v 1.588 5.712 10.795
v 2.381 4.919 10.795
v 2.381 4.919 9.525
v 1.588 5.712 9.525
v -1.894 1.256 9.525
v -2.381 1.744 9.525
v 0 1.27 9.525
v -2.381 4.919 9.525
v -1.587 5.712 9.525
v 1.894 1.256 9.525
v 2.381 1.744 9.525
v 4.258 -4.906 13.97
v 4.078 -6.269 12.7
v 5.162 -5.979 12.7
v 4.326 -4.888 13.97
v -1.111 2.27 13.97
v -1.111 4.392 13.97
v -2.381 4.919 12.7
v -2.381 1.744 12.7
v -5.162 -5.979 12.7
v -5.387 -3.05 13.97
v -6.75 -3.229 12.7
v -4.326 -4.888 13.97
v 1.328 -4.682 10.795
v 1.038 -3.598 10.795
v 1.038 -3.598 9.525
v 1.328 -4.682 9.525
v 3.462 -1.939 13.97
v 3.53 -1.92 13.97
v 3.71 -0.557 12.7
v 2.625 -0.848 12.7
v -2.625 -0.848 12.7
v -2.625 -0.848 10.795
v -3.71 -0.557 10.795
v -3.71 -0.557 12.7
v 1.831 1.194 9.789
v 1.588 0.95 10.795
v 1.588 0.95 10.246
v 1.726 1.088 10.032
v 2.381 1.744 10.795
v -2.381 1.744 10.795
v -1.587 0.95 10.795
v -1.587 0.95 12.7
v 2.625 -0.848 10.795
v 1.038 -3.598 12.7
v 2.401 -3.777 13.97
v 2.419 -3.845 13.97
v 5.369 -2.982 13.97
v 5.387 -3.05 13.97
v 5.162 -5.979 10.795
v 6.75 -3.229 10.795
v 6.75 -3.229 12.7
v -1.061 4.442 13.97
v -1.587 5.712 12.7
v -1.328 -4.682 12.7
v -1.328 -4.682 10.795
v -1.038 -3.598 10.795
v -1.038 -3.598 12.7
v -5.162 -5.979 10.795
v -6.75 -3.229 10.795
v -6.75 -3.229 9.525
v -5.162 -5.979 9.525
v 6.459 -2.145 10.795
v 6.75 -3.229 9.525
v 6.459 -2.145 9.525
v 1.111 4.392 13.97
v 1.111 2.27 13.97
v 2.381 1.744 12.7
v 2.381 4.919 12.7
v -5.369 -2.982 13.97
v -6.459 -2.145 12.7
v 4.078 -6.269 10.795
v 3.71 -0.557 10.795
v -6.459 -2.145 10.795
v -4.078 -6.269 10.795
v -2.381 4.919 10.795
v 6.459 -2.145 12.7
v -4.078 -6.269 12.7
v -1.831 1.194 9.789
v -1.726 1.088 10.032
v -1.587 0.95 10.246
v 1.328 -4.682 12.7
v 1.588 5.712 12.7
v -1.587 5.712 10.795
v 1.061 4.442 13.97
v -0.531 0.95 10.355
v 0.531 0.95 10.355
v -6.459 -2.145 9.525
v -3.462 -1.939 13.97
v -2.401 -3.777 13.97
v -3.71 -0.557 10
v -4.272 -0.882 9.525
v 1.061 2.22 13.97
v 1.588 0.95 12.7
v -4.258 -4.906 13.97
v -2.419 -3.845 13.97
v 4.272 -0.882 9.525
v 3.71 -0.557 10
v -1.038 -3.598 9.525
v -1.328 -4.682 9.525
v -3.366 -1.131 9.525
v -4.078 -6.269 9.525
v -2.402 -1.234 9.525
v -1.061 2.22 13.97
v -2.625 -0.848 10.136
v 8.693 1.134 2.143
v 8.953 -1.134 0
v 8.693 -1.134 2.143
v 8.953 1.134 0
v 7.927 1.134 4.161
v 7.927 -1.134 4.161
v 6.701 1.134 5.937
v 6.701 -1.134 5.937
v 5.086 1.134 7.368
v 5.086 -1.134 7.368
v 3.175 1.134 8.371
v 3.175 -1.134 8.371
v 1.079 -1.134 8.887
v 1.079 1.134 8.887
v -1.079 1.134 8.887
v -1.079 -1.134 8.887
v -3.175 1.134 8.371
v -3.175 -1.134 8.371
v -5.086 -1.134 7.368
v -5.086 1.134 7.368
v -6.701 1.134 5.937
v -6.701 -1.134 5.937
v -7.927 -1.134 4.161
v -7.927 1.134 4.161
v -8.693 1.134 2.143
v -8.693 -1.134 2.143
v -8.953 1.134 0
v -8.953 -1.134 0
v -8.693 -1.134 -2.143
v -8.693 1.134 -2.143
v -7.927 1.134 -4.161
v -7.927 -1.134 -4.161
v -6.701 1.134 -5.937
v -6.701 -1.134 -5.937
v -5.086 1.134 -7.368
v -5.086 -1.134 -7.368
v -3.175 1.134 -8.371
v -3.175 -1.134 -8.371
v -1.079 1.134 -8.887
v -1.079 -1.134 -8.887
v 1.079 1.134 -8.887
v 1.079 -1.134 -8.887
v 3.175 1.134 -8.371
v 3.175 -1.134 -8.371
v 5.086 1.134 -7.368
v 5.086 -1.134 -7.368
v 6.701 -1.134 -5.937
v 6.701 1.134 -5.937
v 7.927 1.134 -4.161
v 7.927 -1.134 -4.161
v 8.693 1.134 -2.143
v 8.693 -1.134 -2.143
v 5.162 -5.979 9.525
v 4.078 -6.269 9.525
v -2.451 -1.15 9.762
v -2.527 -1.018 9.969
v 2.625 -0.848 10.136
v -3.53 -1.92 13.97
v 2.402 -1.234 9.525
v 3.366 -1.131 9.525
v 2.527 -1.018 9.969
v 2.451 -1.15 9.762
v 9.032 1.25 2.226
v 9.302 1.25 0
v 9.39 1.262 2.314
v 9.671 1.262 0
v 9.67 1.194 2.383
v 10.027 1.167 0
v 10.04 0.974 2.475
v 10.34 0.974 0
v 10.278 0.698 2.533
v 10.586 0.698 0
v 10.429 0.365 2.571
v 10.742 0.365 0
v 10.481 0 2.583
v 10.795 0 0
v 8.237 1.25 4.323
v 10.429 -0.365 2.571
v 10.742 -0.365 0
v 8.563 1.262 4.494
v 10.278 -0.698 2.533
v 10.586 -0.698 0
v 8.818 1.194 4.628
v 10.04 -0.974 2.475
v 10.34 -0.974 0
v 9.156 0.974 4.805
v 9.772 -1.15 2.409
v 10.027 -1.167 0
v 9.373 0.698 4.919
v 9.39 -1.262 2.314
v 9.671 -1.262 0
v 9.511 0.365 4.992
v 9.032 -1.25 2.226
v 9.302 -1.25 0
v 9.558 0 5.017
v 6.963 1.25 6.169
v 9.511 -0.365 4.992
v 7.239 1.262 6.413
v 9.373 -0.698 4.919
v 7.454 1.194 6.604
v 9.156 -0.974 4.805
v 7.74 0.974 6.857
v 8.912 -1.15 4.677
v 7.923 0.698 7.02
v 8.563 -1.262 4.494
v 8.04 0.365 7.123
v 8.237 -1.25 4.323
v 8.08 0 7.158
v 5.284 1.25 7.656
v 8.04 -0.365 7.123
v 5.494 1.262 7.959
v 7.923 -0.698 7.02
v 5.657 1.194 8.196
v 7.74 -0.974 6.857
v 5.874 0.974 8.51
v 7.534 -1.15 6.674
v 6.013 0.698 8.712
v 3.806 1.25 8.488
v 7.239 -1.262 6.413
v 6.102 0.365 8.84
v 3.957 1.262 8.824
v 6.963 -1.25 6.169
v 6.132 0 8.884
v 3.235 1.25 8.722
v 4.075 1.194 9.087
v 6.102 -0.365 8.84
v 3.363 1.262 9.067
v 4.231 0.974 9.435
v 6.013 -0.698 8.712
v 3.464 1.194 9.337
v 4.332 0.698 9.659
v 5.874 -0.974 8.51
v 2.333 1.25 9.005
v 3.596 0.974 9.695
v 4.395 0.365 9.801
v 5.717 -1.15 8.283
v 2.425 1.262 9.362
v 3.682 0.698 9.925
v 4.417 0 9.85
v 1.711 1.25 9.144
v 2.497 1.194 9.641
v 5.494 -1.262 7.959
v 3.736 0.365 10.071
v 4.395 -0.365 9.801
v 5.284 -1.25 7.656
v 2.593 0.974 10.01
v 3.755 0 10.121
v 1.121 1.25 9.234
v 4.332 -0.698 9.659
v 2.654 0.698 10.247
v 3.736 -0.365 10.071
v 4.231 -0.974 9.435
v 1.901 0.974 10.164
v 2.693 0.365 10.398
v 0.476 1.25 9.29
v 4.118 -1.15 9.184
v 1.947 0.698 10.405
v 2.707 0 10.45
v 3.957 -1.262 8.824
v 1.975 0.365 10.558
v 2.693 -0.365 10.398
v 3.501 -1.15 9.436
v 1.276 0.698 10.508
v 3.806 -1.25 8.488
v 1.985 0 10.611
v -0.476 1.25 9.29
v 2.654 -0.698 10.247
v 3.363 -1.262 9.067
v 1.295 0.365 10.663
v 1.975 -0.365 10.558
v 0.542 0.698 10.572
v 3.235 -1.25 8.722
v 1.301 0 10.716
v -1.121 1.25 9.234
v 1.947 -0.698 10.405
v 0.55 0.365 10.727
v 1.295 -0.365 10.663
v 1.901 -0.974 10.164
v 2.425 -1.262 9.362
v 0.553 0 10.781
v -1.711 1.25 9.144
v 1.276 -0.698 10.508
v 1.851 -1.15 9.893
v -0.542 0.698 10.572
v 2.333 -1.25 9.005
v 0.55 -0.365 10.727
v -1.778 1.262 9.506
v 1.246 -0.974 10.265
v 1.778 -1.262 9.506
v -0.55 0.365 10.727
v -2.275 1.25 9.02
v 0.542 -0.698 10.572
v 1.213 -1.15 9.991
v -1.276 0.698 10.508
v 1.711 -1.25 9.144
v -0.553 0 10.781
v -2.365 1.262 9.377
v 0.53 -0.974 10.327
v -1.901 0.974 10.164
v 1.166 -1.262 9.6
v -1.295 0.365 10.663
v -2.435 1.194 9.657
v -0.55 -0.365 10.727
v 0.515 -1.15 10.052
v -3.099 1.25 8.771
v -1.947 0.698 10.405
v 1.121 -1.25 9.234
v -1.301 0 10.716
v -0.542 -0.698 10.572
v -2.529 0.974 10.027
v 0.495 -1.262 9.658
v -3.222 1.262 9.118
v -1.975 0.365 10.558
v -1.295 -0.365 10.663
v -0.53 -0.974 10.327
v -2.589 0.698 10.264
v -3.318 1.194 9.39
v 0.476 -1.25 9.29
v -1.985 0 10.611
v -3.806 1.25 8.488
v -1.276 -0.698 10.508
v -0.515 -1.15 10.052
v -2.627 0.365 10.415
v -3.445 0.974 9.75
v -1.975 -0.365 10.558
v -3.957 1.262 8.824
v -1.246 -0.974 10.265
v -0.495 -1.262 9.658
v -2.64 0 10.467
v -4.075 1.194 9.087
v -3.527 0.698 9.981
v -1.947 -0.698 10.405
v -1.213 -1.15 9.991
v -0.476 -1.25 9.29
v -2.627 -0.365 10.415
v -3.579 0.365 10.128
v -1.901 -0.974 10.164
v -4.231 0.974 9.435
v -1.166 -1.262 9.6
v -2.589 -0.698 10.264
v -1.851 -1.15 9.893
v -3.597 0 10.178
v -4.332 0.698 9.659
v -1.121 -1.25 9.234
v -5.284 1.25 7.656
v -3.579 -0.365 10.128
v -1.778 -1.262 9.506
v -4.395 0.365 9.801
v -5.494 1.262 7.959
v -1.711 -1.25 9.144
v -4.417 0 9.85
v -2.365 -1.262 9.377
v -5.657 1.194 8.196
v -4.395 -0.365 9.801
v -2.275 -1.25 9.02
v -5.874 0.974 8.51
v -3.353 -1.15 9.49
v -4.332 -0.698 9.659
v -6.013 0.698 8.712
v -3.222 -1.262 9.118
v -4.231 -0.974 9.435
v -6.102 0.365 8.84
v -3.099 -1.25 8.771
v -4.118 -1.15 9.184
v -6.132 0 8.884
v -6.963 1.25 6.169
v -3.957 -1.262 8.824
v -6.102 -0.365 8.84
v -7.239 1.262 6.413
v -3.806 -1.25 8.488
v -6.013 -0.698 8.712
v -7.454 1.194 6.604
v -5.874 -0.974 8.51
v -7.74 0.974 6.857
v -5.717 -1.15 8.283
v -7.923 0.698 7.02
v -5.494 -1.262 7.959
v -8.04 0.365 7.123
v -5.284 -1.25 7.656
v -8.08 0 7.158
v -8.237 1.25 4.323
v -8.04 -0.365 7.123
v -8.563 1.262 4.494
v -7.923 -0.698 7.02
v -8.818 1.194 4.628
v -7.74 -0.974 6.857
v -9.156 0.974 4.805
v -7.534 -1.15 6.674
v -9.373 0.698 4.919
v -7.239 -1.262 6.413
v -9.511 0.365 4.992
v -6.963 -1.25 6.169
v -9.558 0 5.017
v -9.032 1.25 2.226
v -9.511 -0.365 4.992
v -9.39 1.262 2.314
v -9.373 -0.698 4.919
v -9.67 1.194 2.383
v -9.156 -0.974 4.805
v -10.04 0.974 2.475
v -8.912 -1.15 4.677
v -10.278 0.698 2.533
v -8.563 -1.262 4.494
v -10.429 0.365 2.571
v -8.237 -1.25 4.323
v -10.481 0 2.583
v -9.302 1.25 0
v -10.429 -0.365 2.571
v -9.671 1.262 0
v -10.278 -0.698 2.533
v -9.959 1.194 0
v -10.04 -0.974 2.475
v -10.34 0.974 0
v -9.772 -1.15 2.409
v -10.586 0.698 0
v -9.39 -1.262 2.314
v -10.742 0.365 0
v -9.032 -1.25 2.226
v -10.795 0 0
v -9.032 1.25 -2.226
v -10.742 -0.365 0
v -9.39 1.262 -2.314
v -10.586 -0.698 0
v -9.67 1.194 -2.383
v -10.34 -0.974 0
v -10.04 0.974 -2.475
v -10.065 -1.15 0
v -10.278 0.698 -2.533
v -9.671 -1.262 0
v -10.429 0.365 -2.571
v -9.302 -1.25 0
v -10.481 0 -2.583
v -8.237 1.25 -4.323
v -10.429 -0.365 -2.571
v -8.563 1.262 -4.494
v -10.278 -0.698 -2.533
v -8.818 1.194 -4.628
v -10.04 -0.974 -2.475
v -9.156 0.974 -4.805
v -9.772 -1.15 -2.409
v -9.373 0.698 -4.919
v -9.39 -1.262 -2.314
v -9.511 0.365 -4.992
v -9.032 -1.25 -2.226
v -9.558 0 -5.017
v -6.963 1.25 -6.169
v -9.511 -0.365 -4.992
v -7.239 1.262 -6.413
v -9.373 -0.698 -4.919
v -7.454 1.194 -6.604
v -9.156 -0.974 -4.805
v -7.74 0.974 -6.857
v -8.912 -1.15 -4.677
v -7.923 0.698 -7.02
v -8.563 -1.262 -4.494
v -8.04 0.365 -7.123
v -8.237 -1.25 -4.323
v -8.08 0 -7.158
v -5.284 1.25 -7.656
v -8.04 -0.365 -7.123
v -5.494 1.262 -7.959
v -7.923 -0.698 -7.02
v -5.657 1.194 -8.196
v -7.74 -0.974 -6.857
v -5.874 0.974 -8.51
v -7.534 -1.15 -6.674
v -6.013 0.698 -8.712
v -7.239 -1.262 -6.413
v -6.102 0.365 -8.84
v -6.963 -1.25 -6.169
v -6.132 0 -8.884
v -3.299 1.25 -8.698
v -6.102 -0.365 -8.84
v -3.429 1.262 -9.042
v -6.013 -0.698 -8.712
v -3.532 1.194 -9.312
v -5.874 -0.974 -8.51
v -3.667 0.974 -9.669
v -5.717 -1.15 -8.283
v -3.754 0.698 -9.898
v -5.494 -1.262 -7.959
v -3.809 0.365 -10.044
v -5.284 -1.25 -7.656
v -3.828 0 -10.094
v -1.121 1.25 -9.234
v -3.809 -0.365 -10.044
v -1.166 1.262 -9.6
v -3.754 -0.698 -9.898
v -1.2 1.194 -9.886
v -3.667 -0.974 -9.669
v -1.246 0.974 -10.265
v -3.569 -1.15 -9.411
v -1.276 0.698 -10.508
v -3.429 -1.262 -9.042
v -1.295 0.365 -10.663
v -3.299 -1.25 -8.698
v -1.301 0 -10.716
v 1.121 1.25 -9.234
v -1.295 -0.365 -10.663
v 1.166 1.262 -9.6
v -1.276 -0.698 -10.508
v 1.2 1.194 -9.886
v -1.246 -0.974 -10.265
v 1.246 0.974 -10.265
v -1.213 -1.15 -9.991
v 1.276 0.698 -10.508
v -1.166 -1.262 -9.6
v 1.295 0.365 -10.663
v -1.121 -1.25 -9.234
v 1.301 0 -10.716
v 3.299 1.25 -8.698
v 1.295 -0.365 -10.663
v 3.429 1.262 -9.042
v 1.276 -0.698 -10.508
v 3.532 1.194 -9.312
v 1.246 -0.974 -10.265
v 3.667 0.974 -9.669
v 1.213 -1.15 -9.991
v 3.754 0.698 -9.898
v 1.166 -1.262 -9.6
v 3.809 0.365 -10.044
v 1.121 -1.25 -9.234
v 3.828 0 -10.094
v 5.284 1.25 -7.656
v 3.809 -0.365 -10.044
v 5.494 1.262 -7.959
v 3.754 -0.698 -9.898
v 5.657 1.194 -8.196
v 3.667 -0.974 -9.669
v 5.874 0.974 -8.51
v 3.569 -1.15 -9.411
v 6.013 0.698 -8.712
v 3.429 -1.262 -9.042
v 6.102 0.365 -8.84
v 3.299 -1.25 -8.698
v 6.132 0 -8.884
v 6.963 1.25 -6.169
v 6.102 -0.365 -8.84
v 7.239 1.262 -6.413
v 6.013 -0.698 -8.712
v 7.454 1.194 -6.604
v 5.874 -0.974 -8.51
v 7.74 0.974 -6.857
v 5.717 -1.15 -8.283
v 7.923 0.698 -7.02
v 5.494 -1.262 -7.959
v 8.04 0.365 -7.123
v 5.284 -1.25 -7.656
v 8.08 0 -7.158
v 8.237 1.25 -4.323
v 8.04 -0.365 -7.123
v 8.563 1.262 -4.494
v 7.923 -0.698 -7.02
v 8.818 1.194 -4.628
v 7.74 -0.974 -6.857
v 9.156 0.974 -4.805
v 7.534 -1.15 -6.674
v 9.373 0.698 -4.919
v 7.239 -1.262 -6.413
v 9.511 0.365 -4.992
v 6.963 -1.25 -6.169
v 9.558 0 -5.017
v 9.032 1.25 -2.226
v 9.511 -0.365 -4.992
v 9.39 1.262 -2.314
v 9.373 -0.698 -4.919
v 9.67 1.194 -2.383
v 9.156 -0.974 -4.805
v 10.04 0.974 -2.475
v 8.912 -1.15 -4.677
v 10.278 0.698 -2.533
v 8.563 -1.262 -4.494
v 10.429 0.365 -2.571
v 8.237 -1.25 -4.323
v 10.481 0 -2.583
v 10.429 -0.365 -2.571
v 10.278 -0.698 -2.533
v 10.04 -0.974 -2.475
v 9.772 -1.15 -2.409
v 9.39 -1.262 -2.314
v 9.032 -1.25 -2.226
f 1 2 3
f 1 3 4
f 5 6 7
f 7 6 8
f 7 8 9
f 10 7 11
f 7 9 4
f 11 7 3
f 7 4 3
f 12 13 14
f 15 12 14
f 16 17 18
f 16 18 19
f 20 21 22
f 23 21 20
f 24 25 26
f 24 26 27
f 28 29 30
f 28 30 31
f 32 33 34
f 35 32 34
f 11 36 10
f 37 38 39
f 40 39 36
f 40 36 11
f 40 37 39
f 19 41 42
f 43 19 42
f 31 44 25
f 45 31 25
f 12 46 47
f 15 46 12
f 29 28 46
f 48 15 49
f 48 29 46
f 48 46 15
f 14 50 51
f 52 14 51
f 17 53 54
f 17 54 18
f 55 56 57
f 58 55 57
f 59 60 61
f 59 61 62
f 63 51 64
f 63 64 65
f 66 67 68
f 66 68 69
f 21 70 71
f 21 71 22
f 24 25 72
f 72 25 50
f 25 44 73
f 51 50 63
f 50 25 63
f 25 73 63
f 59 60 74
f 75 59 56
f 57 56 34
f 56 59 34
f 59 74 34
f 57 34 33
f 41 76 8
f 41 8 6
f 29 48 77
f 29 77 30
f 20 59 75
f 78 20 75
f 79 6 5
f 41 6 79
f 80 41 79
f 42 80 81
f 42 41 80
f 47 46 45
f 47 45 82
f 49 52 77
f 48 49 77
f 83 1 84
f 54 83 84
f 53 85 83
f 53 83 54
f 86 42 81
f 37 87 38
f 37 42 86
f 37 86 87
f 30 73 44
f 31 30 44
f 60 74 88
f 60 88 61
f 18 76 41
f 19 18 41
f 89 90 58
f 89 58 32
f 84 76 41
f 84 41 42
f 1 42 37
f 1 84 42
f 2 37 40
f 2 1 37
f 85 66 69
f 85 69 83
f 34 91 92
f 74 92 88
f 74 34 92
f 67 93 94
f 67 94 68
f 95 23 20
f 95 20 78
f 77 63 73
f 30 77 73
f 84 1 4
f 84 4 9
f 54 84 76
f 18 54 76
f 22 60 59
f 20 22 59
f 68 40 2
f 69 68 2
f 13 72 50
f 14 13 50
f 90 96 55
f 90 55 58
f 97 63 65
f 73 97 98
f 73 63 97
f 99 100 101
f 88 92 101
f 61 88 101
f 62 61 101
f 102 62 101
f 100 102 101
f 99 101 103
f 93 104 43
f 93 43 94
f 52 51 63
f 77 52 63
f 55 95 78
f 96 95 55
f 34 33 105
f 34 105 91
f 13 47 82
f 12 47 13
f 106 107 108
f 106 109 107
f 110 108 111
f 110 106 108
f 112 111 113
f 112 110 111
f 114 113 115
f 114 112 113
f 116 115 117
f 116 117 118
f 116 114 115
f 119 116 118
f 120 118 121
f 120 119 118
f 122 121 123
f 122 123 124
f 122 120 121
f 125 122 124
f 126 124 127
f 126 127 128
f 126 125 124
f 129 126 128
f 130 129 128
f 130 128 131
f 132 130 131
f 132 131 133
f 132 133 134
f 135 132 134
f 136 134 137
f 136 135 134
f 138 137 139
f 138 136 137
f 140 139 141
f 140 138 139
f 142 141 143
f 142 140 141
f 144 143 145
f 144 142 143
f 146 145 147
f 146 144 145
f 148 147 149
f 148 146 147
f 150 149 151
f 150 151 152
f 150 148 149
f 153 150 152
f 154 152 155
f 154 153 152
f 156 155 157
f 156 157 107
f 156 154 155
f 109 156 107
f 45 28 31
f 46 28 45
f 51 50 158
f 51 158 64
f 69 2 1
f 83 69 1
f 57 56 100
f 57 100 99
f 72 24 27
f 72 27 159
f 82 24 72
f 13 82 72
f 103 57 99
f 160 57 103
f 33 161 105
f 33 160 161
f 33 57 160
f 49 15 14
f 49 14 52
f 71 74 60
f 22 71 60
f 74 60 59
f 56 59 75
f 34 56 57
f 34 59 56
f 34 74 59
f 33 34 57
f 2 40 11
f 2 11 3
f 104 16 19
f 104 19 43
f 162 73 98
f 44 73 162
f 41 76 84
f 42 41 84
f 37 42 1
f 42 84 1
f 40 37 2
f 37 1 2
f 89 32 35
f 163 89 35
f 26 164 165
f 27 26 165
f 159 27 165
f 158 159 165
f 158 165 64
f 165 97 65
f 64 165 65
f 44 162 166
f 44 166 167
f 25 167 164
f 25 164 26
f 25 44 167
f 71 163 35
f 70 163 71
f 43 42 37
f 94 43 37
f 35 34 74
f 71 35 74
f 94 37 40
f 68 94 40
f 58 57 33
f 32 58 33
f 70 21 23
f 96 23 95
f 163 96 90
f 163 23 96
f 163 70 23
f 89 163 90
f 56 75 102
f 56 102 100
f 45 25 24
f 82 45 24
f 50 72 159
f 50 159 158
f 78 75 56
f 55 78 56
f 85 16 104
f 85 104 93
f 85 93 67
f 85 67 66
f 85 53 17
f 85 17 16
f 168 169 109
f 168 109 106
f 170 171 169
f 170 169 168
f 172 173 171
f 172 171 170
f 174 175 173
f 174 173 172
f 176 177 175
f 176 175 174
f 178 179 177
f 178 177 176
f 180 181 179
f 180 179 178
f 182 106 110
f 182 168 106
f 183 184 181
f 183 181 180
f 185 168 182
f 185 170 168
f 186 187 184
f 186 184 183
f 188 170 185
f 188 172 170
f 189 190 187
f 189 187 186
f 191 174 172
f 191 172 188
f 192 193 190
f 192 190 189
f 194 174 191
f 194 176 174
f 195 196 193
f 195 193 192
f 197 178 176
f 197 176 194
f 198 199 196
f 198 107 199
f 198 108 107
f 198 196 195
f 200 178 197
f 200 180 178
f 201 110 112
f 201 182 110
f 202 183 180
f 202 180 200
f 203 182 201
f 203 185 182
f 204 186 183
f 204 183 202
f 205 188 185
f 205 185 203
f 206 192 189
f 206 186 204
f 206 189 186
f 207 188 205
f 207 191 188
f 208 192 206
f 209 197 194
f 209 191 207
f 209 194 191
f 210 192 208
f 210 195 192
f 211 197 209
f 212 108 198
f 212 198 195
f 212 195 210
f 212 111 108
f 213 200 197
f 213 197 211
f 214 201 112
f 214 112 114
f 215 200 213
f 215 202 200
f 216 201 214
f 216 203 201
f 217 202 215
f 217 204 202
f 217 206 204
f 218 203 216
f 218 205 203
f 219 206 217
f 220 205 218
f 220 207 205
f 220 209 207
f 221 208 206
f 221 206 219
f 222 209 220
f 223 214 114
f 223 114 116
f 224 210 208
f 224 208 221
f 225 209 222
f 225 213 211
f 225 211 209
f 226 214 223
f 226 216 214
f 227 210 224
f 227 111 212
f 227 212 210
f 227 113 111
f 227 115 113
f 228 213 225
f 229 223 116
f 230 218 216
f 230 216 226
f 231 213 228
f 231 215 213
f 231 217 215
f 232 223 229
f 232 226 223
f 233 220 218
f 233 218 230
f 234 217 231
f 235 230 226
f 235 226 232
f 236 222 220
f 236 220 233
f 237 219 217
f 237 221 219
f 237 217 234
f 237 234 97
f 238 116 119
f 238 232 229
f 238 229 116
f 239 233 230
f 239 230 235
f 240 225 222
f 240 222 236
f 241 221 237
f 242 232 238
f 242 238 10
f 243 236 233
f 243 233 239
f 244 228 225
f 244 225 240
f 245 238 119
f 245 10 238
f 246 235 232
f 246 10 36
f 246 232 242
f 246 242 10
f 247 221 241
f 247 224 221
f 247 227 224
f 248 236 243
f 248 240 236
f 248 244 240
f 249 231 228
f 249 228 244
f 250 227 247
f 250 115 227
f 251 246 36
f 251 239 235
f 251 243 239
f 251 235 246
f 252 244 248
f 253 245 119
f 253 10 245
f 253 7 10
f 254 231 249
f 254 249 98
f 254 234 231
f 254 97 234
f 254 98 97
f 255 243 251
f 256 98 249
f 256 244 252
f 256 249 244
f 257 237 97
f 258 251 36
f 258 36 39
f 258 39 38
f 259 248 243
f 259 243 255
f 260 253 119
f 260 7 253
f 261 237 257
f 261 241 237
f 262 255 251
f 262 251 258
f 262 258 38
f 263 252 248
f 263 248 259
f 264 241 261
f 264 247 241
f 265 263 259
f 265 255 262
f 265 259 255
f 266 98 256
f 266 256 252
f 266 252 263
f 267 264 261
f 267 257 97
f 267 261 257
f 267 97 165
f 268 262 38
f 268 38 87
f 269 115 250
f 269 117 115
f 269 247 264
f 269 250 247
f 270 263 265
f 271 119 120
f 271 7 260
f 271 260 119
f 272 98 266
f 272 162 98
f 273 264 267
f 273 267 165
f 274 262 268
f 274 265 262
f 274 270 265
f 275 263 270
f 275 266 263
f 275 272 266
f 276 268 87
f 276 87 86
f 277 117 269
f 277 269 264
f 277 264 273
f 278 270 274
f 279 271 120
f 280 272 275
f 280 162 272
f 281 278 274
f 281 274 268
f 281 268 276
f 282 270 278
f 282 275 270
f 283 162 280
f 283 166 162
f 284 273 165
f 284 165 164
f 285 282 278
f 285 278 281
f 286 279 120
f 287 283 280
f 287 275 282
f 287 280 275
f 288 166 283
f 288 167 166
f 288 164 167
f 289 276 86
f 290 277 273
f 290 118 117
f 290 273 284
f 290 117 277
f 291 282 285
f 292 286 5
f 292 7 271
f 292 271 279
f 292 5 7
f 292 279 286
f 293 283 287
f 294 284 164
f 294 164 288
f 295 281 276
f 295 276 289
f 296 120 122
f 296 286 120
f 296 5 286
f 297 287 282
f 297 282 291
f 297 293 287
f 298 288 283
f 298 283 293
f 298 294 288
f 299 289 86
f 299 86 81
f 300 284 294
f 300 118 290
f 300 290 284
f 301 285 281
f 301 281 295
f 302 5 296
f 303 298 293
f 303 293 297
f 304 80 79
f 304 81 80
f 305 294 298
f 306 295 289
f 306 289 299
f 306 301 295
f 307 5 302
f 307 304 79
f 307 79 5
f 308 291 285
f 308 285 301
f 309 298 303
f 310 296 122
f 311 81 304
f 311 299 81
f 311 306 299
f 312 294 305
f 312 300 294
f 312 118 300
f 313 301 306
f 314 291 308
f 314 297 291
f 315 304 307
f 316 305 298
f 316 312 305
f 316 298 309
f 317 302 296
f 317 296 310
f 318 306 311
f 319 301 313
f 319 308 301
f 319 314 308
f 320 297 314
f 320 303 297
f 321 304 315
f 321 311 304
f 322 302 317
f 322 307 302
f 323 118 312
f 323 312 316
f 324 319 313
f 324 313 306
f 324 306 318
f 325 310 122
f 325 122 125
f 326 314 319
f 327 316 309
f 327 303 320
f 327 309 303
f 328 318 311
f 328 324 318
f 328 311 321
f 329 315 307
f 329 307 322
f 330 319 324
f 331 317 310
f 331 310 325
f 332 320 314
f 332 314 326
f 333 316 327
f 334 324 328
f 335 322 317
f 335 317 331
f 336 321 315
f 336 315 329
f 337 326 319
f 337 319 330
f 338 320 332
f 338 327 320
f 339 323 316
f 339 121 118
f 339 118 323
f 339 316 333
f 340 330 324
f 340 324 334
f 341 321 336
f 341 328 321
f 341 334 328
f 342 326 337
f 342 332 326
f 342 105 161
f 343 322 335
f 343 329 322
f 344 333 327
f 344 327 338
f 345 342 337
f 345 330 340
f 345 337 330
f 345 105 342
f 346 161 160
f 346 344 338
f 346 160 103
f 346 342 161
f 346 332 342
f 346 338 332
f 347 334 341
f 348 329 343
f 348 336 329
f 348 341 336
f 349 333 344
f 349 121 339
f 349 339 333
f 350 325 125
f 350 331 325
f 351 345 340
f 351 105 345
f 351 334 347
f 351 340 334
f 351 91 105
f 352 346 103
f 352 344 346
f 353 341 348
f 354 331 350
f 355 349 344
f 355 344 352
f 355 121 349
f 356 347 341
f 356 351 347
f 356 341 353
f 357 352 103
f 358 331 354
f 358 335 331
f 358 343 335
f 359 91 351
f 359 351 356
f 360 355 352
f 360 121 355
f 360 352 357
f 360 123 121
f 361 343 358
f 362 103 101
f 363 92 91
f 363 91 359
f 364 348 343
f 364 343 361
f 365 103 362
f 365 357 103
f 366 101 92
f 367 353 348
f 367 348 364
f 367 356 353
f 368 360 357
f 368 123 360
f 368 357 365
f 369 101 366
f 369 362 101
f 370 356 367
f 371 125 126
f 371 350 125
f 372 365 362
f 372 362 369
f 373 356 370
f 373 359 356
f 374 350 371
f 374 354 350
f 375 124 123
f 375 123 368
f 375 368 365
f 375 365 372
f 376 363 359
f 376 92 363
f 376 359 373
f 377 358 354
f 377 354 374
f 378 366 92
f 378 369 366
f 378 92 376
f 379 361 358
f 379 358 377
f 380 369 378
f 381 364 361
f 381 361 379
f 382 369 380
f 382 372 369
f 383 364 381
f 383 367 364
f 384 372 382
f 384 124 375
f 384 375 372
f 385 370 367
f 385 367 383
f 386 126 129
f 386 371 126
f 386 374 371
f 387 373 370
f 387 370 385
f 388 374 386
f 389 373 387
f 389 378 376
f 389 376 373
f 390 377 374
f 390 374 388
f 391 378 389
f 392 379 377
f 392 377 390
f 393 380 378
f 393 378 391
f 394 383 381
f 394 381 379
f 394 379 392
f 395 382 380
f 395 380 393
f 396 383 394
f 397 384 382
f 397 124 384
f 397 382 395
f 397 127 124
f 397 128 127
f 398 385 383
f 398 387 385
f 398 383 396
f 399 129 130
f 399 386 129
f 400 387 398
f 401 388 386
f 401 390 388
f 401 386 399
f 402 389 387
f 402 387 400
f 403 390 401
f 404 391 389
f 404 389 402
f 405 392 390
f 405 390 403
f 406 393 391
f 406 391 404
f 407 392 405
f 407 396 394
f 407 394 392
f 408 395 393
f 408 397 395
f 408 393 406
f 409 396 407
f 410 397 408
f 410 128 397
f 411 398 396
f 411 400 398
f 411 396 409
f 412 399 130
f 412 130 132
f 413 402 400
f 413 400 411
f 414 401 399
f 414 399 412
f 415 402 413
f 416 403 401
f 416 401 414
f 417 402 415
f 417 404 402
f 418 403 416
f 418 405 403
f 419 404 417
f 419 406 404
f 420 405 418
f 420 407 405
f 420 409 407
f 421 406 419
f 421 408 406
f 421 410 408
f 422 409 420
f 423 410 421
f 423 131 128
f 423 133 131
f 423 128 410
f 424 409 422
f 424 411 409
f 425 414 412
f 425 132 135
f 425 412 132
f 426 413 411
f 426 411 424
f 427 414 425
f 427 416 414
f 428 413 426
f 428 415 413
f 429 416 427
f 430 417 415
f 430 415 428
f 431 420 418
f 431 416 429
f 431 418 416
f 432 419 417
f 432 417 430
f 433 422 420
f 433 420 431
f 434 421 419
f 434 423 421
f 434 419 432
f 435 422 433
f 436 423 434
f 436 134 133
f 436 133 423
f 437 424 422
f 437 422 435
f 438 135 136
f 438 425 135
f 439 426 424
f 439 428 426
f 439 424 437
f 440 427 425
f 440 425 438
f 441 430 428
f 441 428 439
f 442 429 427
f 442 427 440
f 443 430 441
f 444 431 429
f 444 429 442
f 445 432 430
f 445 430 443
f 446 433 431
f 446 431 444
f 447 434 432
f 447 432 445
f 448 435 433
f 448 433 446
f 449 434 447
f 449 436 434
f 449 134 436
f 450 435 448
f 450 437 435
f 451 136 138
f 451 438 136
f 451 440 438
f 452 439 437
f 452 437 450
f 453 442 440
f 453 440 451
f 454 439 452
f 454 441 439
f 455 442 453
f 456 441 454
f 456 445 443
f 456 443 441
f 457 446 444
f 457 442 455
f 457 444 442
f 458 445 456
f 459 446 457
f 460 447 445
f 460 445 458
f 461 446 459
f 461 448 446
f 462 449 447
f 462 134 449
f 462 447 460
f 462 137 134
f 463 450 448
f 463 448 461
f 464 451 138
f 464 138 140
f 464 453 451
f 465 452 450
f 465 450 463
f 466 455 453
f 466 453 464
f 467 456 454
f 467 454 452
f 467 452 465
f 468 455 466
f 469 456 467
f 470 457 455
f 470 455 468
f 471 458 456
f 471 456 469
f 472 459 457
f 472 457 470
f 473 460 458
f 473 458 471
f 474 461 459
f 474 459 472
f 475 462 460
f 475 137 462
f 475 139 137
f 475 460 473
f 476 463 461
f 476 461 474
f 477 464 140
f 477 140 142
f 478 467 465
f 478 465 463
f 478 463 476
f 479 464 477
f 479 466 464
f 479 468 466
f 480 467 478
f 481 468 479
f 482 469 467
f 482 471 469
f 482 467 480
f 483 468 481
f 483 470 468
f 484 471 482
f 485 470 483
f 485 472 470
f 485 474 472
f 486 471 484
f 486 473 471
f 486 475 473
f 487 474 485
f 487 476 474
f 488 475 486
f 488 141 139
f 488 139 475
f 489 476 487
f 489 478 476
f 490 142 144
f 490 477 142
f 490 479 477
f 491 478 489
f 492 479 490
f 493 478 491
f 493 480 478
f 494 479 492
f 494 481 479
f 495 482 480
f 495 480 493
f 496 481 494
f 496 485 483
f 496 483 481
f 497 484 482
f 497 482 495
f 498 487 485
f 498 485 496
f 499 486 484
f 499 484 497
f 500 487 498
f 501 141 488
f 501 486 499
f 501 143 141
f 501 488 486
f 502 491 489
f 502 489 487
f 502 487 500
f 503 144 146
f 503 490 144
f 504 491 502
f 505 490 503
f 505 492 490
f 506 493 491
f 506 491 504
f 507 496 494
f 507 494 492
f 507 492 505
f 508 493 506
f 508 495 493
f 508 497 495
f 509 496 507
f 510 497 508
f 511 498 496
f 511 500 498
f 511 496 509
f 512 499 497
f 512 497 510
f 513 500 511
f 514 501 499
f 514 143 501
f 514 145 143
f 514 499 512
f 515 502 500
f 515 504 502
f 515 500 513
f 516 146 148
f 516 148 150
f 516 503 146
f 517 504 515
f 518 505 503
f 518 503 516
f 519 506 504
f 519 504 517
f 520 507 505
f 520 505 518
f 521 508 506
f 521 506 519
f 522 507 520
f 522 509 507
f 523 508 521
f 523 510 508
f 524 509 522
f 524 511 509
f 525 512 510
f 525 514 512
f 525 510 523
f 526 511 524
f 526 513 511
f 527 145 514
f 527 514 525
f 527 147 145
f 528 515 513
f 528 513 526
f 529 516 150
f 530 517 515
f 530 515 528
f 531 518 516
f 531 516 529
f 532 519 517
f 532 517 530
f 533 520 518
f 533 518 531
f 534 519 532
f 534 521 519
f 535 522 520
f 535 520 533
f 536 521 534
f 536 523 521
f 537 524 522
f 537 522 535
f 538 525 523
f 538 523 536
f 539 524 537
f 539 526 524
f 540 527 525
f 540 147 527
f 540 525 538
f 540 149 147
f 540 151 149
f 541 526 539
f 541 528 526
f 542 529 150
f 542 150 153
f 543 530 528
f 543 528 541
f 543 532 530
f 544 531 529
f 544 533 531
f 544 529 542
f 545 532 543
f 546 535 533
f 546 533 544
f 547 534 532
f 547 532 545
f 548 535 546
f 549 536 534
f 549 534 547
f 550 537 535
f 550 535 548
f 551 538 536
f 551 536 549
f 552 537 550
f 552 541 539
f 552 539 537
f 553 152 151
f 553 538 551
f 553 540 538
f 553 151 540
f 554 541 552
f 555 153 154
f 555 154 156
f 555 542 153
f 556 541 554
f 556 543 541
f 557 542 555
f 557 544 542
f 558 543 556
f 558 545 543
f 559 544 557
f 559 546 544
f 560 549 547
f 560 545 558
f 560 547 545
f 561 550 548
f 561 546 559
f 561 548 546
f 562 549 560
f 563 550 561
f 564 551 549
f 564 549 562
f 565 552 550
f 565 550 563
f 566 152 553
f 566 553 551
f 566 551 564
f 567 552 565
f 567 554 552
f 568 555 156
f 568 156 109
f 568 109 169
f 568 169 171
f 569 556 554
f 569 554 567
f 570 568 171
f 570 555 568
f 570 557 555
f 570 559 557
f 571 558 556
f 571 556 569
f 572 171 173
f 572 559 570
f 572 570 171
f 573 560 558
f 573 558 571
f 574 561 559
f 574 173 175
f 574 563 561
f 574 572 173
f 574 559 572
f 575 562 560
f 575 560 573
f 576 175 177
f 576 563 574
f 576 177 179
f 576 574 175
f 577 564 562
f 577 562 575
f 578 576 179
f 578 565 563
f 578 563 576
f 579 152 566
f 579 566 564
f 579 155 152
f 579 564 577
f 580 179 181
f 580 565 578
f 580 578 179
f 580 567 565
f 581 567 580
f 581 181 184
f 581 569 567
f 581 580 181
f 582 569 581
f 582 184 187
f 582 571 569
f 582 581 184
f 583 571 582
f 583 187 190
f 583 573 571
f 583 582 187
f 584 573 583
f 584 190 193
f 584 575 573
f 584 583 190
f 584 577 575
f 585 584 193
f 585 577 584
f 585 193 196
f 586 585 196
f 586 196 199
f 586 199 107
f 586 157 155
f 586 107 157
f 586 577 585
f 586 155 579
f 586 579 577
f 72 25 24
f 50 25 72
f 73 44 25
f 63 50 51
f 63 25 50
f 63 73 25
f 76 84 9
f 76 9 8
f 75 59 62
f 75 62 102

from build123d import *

# Parameters (mm, degrees)
F5_DEPTH  = 3.175
F6_SIZE   = 1.27
F6_2_SIZE = 1.27
F6_3_SIZE = 1.27
F7_DEPTH  = 1.27


with BuildPart() as f2:
    # F2: sweep along a path in F0
    with BuildLine(Plane.XZ) as f2_path:
        CenterArc((0, 0), 9.525, 0, 360)
    # F1 (on Top) → F2 (sweep)
    with BuildSketch(Plane.XY):
        with BuildLine():
            Line((-8.9527293057, 0), (-8.9527293057, 1.133757581))
            ThreePointArc((-8.9527293057, 1.133757581), (-10.795, 0), (-8.9527293057, -1.133757581))
            Line((-8.9527293057, -1.133757581), (-8.9527293057, 0))
        make_face()
    sweep(path=f2_path.line)

    # F4 (on offset) → F7 (join)
    with BuildSketch(Plane.XY.offset(10.795)):
        Polygon((2.625412817, -0.8479611432), (1.831662817, -2.2227764717), (1.037912817, -3.5975918002), (1.3284454812, -4.6818744645), (2.7032608097, -5.4756244645), (4.0780761382, -6.2693744645), (5.1623588025, -5.9788418002), (5.9561088025, -4.6040264717), (6.7498588025, -3.2292111432), (6.4593261382, -2.144928479), (5.0845108097, -1.351178479), (3.7096954812, -0.557428479), align=None)
        Polygon((-1.0379127641, -3.5975918002), (-1.8316627641, -2.2227764717), (-2.6254127641, -0.8479611432), (-3.7096954284, -0.557428479), (-5.0845107569, -1.351178479), (-6.4593260854, -2.144928479), (-6.7498587497, -3.2292111432), (-5.9561087497, -4.6040264717), (-5.1623587497, -5.9788418002), (-4.0780760854, -6.2693744645), (-2.7032607569, -5.4756244645), (-1.3284454284, -4.6818744645), align=None)
        Polygon((-1.5874999736, 0.9497565438), (2.64e-08, 0.9497565438), (1.5875000264, 0.9497565438), (2.3812500264, 1.7435065438), (2.3812500264, 3.3310065438), (2.3812500264, 4.9185065438), (1.5875000264, 5.7122565438), (2.64e-08, 5.7122565438), (-1.5874999736, 5.7122565438), (-2.3812499736, 4.9185065438), (-2.3812499736, 3.3310065438), (-2.3812499736, 1.7435065438), align=None)
    extrude(amount=-F7_DEPTH)


with BuildPart() as f5:
    # F4 (on offset) → F5 (new body)
    with BuildSketch(Plane.XY.offset(10.795)):
        Polygon((-1.5874999736, 0.9497565438), (2.64e-08, 0.9497565438), (1.5875000264, 0.9497565438), (2.3812500264, 1.7435065438), (2.3812500264, 3.3310065438), (2.3812500264, 4.9185065438), (1.5875000264, 5.7122565438), (2.64e-08, 5.7122565438), (-1.5874999736, 5.7122565438), (-2.3812499736, 4.9185065438), (-2.3812499736, 3.3310065438), (-2.3812499736, 1.7435065438), align=None)
    extrude(amount=F5_DEPTH)

    # F6
    f6_edges = [f5.edges().sort_by_distance(p)[0] for p in [
        (-1.984375, 1.346632, 13.97),
        (0, 0.949757, 13.97),
        (1.984375, 1.346632, 13.97),
        (2.38125, 3.331007, 13.97),
        (1.984375, 5.315382, 13.97),
        (0, 5.712257, 13.97),
        (-1.984375, 5.315382, 13.97),
        (-2.38125, 3.331007, 13.97),
    ]]
    chamfer(f6_edges, length=F6_SIZE)


with BuildPart() as f5b:
    # F4 (on offset) → F5, piece 2 (new body)
    with BuildSketch(Plane.XY.offset(10.795)):
        Polygon((-1.0379127641, -3.5975918002), (-1.8316627641, -2.2227764717), (-2.6254127641, -0.8479611432), (-3.7096954284, -0.557428479), (-5.0845107569, -1.351178479), (-6.4593260854, -2.144928479), (-6.7498587497, -3.2292111432), (-5.9561087497, -4.6040264717), (-5.1623587497, -5.9788418002), (-4.0780760854, -6.2693744645), (-2.7032607569, -5.4756244645), (-1.3284454284, -4.6818744645), align=None)
    extrude(amount=F5_DEPTH)

    # F6#2
    f6_2_edges = [f5b.edges().sort_by_distance(p)[0] for p in [
        (-1.831663, -2.222776, 13.97),
        (-3.167554, -0.702695, 13.97),
        (-5.084511, -1.351178, 13.97),
        (-6.604592, -2.68707, 13.97),
        (-5.956109, -4.604026, 13.97),
        (-4.620217, -6.124108, 13.97),
        (-2.703261, -5.475624, 13.97),
        (-1.183179, -4.139733, 13.97),
    ]]
    chamfer(f6_2_edges, length=F6_2_SIZE)


with BuildPart() as f5c:
    # F4 (on offset) → F5, piece 3 (new body)
    with BuildSketch(Plane.XY.offset(10.795)):
        Polygon((2.625412817, -0.8479611432), (1.831662817, -2.2227764717), (1.037912817, -3.5975918002), (1.3284454812, -4.6818744645), (2.7032608097, -5.4756244645), (4.0780761382, -6.2693744645), (5.1623588025, -5.9788418002), (5.9561088025, -4.6040264717), (6.7498588025, -3.2292111432), (6.4593261382, -2.144928479), (5.0845108097, -1.351178479), (3.7096954812, -0.557428479), align=None)
    extrude(amount=F5_DEPTH)

    # F6#3
    f6_3_edges = [f5c.edges().sort_by_distance(p)[0] for p in [
        (5.084511, -1.351178, 13.97),
        (3.167554, -0.702695, 13.97),
        (1.831663, -2.222776, 13.97),
        (1.183179, -4.139733, 13.97),
        (2.703261, -5.475624, 13.97),
        (4.620217, -6.124108, 13.97),
        (5.956109, -4.604026, 13.97),
        (6.604592, -2.68707, 13.97),
    ]]
    chamfer(f6_3_edges, length=F6_3_SIZE)


solid = Compound([f2.part, f5.part, f5b.part, f5c.part])
